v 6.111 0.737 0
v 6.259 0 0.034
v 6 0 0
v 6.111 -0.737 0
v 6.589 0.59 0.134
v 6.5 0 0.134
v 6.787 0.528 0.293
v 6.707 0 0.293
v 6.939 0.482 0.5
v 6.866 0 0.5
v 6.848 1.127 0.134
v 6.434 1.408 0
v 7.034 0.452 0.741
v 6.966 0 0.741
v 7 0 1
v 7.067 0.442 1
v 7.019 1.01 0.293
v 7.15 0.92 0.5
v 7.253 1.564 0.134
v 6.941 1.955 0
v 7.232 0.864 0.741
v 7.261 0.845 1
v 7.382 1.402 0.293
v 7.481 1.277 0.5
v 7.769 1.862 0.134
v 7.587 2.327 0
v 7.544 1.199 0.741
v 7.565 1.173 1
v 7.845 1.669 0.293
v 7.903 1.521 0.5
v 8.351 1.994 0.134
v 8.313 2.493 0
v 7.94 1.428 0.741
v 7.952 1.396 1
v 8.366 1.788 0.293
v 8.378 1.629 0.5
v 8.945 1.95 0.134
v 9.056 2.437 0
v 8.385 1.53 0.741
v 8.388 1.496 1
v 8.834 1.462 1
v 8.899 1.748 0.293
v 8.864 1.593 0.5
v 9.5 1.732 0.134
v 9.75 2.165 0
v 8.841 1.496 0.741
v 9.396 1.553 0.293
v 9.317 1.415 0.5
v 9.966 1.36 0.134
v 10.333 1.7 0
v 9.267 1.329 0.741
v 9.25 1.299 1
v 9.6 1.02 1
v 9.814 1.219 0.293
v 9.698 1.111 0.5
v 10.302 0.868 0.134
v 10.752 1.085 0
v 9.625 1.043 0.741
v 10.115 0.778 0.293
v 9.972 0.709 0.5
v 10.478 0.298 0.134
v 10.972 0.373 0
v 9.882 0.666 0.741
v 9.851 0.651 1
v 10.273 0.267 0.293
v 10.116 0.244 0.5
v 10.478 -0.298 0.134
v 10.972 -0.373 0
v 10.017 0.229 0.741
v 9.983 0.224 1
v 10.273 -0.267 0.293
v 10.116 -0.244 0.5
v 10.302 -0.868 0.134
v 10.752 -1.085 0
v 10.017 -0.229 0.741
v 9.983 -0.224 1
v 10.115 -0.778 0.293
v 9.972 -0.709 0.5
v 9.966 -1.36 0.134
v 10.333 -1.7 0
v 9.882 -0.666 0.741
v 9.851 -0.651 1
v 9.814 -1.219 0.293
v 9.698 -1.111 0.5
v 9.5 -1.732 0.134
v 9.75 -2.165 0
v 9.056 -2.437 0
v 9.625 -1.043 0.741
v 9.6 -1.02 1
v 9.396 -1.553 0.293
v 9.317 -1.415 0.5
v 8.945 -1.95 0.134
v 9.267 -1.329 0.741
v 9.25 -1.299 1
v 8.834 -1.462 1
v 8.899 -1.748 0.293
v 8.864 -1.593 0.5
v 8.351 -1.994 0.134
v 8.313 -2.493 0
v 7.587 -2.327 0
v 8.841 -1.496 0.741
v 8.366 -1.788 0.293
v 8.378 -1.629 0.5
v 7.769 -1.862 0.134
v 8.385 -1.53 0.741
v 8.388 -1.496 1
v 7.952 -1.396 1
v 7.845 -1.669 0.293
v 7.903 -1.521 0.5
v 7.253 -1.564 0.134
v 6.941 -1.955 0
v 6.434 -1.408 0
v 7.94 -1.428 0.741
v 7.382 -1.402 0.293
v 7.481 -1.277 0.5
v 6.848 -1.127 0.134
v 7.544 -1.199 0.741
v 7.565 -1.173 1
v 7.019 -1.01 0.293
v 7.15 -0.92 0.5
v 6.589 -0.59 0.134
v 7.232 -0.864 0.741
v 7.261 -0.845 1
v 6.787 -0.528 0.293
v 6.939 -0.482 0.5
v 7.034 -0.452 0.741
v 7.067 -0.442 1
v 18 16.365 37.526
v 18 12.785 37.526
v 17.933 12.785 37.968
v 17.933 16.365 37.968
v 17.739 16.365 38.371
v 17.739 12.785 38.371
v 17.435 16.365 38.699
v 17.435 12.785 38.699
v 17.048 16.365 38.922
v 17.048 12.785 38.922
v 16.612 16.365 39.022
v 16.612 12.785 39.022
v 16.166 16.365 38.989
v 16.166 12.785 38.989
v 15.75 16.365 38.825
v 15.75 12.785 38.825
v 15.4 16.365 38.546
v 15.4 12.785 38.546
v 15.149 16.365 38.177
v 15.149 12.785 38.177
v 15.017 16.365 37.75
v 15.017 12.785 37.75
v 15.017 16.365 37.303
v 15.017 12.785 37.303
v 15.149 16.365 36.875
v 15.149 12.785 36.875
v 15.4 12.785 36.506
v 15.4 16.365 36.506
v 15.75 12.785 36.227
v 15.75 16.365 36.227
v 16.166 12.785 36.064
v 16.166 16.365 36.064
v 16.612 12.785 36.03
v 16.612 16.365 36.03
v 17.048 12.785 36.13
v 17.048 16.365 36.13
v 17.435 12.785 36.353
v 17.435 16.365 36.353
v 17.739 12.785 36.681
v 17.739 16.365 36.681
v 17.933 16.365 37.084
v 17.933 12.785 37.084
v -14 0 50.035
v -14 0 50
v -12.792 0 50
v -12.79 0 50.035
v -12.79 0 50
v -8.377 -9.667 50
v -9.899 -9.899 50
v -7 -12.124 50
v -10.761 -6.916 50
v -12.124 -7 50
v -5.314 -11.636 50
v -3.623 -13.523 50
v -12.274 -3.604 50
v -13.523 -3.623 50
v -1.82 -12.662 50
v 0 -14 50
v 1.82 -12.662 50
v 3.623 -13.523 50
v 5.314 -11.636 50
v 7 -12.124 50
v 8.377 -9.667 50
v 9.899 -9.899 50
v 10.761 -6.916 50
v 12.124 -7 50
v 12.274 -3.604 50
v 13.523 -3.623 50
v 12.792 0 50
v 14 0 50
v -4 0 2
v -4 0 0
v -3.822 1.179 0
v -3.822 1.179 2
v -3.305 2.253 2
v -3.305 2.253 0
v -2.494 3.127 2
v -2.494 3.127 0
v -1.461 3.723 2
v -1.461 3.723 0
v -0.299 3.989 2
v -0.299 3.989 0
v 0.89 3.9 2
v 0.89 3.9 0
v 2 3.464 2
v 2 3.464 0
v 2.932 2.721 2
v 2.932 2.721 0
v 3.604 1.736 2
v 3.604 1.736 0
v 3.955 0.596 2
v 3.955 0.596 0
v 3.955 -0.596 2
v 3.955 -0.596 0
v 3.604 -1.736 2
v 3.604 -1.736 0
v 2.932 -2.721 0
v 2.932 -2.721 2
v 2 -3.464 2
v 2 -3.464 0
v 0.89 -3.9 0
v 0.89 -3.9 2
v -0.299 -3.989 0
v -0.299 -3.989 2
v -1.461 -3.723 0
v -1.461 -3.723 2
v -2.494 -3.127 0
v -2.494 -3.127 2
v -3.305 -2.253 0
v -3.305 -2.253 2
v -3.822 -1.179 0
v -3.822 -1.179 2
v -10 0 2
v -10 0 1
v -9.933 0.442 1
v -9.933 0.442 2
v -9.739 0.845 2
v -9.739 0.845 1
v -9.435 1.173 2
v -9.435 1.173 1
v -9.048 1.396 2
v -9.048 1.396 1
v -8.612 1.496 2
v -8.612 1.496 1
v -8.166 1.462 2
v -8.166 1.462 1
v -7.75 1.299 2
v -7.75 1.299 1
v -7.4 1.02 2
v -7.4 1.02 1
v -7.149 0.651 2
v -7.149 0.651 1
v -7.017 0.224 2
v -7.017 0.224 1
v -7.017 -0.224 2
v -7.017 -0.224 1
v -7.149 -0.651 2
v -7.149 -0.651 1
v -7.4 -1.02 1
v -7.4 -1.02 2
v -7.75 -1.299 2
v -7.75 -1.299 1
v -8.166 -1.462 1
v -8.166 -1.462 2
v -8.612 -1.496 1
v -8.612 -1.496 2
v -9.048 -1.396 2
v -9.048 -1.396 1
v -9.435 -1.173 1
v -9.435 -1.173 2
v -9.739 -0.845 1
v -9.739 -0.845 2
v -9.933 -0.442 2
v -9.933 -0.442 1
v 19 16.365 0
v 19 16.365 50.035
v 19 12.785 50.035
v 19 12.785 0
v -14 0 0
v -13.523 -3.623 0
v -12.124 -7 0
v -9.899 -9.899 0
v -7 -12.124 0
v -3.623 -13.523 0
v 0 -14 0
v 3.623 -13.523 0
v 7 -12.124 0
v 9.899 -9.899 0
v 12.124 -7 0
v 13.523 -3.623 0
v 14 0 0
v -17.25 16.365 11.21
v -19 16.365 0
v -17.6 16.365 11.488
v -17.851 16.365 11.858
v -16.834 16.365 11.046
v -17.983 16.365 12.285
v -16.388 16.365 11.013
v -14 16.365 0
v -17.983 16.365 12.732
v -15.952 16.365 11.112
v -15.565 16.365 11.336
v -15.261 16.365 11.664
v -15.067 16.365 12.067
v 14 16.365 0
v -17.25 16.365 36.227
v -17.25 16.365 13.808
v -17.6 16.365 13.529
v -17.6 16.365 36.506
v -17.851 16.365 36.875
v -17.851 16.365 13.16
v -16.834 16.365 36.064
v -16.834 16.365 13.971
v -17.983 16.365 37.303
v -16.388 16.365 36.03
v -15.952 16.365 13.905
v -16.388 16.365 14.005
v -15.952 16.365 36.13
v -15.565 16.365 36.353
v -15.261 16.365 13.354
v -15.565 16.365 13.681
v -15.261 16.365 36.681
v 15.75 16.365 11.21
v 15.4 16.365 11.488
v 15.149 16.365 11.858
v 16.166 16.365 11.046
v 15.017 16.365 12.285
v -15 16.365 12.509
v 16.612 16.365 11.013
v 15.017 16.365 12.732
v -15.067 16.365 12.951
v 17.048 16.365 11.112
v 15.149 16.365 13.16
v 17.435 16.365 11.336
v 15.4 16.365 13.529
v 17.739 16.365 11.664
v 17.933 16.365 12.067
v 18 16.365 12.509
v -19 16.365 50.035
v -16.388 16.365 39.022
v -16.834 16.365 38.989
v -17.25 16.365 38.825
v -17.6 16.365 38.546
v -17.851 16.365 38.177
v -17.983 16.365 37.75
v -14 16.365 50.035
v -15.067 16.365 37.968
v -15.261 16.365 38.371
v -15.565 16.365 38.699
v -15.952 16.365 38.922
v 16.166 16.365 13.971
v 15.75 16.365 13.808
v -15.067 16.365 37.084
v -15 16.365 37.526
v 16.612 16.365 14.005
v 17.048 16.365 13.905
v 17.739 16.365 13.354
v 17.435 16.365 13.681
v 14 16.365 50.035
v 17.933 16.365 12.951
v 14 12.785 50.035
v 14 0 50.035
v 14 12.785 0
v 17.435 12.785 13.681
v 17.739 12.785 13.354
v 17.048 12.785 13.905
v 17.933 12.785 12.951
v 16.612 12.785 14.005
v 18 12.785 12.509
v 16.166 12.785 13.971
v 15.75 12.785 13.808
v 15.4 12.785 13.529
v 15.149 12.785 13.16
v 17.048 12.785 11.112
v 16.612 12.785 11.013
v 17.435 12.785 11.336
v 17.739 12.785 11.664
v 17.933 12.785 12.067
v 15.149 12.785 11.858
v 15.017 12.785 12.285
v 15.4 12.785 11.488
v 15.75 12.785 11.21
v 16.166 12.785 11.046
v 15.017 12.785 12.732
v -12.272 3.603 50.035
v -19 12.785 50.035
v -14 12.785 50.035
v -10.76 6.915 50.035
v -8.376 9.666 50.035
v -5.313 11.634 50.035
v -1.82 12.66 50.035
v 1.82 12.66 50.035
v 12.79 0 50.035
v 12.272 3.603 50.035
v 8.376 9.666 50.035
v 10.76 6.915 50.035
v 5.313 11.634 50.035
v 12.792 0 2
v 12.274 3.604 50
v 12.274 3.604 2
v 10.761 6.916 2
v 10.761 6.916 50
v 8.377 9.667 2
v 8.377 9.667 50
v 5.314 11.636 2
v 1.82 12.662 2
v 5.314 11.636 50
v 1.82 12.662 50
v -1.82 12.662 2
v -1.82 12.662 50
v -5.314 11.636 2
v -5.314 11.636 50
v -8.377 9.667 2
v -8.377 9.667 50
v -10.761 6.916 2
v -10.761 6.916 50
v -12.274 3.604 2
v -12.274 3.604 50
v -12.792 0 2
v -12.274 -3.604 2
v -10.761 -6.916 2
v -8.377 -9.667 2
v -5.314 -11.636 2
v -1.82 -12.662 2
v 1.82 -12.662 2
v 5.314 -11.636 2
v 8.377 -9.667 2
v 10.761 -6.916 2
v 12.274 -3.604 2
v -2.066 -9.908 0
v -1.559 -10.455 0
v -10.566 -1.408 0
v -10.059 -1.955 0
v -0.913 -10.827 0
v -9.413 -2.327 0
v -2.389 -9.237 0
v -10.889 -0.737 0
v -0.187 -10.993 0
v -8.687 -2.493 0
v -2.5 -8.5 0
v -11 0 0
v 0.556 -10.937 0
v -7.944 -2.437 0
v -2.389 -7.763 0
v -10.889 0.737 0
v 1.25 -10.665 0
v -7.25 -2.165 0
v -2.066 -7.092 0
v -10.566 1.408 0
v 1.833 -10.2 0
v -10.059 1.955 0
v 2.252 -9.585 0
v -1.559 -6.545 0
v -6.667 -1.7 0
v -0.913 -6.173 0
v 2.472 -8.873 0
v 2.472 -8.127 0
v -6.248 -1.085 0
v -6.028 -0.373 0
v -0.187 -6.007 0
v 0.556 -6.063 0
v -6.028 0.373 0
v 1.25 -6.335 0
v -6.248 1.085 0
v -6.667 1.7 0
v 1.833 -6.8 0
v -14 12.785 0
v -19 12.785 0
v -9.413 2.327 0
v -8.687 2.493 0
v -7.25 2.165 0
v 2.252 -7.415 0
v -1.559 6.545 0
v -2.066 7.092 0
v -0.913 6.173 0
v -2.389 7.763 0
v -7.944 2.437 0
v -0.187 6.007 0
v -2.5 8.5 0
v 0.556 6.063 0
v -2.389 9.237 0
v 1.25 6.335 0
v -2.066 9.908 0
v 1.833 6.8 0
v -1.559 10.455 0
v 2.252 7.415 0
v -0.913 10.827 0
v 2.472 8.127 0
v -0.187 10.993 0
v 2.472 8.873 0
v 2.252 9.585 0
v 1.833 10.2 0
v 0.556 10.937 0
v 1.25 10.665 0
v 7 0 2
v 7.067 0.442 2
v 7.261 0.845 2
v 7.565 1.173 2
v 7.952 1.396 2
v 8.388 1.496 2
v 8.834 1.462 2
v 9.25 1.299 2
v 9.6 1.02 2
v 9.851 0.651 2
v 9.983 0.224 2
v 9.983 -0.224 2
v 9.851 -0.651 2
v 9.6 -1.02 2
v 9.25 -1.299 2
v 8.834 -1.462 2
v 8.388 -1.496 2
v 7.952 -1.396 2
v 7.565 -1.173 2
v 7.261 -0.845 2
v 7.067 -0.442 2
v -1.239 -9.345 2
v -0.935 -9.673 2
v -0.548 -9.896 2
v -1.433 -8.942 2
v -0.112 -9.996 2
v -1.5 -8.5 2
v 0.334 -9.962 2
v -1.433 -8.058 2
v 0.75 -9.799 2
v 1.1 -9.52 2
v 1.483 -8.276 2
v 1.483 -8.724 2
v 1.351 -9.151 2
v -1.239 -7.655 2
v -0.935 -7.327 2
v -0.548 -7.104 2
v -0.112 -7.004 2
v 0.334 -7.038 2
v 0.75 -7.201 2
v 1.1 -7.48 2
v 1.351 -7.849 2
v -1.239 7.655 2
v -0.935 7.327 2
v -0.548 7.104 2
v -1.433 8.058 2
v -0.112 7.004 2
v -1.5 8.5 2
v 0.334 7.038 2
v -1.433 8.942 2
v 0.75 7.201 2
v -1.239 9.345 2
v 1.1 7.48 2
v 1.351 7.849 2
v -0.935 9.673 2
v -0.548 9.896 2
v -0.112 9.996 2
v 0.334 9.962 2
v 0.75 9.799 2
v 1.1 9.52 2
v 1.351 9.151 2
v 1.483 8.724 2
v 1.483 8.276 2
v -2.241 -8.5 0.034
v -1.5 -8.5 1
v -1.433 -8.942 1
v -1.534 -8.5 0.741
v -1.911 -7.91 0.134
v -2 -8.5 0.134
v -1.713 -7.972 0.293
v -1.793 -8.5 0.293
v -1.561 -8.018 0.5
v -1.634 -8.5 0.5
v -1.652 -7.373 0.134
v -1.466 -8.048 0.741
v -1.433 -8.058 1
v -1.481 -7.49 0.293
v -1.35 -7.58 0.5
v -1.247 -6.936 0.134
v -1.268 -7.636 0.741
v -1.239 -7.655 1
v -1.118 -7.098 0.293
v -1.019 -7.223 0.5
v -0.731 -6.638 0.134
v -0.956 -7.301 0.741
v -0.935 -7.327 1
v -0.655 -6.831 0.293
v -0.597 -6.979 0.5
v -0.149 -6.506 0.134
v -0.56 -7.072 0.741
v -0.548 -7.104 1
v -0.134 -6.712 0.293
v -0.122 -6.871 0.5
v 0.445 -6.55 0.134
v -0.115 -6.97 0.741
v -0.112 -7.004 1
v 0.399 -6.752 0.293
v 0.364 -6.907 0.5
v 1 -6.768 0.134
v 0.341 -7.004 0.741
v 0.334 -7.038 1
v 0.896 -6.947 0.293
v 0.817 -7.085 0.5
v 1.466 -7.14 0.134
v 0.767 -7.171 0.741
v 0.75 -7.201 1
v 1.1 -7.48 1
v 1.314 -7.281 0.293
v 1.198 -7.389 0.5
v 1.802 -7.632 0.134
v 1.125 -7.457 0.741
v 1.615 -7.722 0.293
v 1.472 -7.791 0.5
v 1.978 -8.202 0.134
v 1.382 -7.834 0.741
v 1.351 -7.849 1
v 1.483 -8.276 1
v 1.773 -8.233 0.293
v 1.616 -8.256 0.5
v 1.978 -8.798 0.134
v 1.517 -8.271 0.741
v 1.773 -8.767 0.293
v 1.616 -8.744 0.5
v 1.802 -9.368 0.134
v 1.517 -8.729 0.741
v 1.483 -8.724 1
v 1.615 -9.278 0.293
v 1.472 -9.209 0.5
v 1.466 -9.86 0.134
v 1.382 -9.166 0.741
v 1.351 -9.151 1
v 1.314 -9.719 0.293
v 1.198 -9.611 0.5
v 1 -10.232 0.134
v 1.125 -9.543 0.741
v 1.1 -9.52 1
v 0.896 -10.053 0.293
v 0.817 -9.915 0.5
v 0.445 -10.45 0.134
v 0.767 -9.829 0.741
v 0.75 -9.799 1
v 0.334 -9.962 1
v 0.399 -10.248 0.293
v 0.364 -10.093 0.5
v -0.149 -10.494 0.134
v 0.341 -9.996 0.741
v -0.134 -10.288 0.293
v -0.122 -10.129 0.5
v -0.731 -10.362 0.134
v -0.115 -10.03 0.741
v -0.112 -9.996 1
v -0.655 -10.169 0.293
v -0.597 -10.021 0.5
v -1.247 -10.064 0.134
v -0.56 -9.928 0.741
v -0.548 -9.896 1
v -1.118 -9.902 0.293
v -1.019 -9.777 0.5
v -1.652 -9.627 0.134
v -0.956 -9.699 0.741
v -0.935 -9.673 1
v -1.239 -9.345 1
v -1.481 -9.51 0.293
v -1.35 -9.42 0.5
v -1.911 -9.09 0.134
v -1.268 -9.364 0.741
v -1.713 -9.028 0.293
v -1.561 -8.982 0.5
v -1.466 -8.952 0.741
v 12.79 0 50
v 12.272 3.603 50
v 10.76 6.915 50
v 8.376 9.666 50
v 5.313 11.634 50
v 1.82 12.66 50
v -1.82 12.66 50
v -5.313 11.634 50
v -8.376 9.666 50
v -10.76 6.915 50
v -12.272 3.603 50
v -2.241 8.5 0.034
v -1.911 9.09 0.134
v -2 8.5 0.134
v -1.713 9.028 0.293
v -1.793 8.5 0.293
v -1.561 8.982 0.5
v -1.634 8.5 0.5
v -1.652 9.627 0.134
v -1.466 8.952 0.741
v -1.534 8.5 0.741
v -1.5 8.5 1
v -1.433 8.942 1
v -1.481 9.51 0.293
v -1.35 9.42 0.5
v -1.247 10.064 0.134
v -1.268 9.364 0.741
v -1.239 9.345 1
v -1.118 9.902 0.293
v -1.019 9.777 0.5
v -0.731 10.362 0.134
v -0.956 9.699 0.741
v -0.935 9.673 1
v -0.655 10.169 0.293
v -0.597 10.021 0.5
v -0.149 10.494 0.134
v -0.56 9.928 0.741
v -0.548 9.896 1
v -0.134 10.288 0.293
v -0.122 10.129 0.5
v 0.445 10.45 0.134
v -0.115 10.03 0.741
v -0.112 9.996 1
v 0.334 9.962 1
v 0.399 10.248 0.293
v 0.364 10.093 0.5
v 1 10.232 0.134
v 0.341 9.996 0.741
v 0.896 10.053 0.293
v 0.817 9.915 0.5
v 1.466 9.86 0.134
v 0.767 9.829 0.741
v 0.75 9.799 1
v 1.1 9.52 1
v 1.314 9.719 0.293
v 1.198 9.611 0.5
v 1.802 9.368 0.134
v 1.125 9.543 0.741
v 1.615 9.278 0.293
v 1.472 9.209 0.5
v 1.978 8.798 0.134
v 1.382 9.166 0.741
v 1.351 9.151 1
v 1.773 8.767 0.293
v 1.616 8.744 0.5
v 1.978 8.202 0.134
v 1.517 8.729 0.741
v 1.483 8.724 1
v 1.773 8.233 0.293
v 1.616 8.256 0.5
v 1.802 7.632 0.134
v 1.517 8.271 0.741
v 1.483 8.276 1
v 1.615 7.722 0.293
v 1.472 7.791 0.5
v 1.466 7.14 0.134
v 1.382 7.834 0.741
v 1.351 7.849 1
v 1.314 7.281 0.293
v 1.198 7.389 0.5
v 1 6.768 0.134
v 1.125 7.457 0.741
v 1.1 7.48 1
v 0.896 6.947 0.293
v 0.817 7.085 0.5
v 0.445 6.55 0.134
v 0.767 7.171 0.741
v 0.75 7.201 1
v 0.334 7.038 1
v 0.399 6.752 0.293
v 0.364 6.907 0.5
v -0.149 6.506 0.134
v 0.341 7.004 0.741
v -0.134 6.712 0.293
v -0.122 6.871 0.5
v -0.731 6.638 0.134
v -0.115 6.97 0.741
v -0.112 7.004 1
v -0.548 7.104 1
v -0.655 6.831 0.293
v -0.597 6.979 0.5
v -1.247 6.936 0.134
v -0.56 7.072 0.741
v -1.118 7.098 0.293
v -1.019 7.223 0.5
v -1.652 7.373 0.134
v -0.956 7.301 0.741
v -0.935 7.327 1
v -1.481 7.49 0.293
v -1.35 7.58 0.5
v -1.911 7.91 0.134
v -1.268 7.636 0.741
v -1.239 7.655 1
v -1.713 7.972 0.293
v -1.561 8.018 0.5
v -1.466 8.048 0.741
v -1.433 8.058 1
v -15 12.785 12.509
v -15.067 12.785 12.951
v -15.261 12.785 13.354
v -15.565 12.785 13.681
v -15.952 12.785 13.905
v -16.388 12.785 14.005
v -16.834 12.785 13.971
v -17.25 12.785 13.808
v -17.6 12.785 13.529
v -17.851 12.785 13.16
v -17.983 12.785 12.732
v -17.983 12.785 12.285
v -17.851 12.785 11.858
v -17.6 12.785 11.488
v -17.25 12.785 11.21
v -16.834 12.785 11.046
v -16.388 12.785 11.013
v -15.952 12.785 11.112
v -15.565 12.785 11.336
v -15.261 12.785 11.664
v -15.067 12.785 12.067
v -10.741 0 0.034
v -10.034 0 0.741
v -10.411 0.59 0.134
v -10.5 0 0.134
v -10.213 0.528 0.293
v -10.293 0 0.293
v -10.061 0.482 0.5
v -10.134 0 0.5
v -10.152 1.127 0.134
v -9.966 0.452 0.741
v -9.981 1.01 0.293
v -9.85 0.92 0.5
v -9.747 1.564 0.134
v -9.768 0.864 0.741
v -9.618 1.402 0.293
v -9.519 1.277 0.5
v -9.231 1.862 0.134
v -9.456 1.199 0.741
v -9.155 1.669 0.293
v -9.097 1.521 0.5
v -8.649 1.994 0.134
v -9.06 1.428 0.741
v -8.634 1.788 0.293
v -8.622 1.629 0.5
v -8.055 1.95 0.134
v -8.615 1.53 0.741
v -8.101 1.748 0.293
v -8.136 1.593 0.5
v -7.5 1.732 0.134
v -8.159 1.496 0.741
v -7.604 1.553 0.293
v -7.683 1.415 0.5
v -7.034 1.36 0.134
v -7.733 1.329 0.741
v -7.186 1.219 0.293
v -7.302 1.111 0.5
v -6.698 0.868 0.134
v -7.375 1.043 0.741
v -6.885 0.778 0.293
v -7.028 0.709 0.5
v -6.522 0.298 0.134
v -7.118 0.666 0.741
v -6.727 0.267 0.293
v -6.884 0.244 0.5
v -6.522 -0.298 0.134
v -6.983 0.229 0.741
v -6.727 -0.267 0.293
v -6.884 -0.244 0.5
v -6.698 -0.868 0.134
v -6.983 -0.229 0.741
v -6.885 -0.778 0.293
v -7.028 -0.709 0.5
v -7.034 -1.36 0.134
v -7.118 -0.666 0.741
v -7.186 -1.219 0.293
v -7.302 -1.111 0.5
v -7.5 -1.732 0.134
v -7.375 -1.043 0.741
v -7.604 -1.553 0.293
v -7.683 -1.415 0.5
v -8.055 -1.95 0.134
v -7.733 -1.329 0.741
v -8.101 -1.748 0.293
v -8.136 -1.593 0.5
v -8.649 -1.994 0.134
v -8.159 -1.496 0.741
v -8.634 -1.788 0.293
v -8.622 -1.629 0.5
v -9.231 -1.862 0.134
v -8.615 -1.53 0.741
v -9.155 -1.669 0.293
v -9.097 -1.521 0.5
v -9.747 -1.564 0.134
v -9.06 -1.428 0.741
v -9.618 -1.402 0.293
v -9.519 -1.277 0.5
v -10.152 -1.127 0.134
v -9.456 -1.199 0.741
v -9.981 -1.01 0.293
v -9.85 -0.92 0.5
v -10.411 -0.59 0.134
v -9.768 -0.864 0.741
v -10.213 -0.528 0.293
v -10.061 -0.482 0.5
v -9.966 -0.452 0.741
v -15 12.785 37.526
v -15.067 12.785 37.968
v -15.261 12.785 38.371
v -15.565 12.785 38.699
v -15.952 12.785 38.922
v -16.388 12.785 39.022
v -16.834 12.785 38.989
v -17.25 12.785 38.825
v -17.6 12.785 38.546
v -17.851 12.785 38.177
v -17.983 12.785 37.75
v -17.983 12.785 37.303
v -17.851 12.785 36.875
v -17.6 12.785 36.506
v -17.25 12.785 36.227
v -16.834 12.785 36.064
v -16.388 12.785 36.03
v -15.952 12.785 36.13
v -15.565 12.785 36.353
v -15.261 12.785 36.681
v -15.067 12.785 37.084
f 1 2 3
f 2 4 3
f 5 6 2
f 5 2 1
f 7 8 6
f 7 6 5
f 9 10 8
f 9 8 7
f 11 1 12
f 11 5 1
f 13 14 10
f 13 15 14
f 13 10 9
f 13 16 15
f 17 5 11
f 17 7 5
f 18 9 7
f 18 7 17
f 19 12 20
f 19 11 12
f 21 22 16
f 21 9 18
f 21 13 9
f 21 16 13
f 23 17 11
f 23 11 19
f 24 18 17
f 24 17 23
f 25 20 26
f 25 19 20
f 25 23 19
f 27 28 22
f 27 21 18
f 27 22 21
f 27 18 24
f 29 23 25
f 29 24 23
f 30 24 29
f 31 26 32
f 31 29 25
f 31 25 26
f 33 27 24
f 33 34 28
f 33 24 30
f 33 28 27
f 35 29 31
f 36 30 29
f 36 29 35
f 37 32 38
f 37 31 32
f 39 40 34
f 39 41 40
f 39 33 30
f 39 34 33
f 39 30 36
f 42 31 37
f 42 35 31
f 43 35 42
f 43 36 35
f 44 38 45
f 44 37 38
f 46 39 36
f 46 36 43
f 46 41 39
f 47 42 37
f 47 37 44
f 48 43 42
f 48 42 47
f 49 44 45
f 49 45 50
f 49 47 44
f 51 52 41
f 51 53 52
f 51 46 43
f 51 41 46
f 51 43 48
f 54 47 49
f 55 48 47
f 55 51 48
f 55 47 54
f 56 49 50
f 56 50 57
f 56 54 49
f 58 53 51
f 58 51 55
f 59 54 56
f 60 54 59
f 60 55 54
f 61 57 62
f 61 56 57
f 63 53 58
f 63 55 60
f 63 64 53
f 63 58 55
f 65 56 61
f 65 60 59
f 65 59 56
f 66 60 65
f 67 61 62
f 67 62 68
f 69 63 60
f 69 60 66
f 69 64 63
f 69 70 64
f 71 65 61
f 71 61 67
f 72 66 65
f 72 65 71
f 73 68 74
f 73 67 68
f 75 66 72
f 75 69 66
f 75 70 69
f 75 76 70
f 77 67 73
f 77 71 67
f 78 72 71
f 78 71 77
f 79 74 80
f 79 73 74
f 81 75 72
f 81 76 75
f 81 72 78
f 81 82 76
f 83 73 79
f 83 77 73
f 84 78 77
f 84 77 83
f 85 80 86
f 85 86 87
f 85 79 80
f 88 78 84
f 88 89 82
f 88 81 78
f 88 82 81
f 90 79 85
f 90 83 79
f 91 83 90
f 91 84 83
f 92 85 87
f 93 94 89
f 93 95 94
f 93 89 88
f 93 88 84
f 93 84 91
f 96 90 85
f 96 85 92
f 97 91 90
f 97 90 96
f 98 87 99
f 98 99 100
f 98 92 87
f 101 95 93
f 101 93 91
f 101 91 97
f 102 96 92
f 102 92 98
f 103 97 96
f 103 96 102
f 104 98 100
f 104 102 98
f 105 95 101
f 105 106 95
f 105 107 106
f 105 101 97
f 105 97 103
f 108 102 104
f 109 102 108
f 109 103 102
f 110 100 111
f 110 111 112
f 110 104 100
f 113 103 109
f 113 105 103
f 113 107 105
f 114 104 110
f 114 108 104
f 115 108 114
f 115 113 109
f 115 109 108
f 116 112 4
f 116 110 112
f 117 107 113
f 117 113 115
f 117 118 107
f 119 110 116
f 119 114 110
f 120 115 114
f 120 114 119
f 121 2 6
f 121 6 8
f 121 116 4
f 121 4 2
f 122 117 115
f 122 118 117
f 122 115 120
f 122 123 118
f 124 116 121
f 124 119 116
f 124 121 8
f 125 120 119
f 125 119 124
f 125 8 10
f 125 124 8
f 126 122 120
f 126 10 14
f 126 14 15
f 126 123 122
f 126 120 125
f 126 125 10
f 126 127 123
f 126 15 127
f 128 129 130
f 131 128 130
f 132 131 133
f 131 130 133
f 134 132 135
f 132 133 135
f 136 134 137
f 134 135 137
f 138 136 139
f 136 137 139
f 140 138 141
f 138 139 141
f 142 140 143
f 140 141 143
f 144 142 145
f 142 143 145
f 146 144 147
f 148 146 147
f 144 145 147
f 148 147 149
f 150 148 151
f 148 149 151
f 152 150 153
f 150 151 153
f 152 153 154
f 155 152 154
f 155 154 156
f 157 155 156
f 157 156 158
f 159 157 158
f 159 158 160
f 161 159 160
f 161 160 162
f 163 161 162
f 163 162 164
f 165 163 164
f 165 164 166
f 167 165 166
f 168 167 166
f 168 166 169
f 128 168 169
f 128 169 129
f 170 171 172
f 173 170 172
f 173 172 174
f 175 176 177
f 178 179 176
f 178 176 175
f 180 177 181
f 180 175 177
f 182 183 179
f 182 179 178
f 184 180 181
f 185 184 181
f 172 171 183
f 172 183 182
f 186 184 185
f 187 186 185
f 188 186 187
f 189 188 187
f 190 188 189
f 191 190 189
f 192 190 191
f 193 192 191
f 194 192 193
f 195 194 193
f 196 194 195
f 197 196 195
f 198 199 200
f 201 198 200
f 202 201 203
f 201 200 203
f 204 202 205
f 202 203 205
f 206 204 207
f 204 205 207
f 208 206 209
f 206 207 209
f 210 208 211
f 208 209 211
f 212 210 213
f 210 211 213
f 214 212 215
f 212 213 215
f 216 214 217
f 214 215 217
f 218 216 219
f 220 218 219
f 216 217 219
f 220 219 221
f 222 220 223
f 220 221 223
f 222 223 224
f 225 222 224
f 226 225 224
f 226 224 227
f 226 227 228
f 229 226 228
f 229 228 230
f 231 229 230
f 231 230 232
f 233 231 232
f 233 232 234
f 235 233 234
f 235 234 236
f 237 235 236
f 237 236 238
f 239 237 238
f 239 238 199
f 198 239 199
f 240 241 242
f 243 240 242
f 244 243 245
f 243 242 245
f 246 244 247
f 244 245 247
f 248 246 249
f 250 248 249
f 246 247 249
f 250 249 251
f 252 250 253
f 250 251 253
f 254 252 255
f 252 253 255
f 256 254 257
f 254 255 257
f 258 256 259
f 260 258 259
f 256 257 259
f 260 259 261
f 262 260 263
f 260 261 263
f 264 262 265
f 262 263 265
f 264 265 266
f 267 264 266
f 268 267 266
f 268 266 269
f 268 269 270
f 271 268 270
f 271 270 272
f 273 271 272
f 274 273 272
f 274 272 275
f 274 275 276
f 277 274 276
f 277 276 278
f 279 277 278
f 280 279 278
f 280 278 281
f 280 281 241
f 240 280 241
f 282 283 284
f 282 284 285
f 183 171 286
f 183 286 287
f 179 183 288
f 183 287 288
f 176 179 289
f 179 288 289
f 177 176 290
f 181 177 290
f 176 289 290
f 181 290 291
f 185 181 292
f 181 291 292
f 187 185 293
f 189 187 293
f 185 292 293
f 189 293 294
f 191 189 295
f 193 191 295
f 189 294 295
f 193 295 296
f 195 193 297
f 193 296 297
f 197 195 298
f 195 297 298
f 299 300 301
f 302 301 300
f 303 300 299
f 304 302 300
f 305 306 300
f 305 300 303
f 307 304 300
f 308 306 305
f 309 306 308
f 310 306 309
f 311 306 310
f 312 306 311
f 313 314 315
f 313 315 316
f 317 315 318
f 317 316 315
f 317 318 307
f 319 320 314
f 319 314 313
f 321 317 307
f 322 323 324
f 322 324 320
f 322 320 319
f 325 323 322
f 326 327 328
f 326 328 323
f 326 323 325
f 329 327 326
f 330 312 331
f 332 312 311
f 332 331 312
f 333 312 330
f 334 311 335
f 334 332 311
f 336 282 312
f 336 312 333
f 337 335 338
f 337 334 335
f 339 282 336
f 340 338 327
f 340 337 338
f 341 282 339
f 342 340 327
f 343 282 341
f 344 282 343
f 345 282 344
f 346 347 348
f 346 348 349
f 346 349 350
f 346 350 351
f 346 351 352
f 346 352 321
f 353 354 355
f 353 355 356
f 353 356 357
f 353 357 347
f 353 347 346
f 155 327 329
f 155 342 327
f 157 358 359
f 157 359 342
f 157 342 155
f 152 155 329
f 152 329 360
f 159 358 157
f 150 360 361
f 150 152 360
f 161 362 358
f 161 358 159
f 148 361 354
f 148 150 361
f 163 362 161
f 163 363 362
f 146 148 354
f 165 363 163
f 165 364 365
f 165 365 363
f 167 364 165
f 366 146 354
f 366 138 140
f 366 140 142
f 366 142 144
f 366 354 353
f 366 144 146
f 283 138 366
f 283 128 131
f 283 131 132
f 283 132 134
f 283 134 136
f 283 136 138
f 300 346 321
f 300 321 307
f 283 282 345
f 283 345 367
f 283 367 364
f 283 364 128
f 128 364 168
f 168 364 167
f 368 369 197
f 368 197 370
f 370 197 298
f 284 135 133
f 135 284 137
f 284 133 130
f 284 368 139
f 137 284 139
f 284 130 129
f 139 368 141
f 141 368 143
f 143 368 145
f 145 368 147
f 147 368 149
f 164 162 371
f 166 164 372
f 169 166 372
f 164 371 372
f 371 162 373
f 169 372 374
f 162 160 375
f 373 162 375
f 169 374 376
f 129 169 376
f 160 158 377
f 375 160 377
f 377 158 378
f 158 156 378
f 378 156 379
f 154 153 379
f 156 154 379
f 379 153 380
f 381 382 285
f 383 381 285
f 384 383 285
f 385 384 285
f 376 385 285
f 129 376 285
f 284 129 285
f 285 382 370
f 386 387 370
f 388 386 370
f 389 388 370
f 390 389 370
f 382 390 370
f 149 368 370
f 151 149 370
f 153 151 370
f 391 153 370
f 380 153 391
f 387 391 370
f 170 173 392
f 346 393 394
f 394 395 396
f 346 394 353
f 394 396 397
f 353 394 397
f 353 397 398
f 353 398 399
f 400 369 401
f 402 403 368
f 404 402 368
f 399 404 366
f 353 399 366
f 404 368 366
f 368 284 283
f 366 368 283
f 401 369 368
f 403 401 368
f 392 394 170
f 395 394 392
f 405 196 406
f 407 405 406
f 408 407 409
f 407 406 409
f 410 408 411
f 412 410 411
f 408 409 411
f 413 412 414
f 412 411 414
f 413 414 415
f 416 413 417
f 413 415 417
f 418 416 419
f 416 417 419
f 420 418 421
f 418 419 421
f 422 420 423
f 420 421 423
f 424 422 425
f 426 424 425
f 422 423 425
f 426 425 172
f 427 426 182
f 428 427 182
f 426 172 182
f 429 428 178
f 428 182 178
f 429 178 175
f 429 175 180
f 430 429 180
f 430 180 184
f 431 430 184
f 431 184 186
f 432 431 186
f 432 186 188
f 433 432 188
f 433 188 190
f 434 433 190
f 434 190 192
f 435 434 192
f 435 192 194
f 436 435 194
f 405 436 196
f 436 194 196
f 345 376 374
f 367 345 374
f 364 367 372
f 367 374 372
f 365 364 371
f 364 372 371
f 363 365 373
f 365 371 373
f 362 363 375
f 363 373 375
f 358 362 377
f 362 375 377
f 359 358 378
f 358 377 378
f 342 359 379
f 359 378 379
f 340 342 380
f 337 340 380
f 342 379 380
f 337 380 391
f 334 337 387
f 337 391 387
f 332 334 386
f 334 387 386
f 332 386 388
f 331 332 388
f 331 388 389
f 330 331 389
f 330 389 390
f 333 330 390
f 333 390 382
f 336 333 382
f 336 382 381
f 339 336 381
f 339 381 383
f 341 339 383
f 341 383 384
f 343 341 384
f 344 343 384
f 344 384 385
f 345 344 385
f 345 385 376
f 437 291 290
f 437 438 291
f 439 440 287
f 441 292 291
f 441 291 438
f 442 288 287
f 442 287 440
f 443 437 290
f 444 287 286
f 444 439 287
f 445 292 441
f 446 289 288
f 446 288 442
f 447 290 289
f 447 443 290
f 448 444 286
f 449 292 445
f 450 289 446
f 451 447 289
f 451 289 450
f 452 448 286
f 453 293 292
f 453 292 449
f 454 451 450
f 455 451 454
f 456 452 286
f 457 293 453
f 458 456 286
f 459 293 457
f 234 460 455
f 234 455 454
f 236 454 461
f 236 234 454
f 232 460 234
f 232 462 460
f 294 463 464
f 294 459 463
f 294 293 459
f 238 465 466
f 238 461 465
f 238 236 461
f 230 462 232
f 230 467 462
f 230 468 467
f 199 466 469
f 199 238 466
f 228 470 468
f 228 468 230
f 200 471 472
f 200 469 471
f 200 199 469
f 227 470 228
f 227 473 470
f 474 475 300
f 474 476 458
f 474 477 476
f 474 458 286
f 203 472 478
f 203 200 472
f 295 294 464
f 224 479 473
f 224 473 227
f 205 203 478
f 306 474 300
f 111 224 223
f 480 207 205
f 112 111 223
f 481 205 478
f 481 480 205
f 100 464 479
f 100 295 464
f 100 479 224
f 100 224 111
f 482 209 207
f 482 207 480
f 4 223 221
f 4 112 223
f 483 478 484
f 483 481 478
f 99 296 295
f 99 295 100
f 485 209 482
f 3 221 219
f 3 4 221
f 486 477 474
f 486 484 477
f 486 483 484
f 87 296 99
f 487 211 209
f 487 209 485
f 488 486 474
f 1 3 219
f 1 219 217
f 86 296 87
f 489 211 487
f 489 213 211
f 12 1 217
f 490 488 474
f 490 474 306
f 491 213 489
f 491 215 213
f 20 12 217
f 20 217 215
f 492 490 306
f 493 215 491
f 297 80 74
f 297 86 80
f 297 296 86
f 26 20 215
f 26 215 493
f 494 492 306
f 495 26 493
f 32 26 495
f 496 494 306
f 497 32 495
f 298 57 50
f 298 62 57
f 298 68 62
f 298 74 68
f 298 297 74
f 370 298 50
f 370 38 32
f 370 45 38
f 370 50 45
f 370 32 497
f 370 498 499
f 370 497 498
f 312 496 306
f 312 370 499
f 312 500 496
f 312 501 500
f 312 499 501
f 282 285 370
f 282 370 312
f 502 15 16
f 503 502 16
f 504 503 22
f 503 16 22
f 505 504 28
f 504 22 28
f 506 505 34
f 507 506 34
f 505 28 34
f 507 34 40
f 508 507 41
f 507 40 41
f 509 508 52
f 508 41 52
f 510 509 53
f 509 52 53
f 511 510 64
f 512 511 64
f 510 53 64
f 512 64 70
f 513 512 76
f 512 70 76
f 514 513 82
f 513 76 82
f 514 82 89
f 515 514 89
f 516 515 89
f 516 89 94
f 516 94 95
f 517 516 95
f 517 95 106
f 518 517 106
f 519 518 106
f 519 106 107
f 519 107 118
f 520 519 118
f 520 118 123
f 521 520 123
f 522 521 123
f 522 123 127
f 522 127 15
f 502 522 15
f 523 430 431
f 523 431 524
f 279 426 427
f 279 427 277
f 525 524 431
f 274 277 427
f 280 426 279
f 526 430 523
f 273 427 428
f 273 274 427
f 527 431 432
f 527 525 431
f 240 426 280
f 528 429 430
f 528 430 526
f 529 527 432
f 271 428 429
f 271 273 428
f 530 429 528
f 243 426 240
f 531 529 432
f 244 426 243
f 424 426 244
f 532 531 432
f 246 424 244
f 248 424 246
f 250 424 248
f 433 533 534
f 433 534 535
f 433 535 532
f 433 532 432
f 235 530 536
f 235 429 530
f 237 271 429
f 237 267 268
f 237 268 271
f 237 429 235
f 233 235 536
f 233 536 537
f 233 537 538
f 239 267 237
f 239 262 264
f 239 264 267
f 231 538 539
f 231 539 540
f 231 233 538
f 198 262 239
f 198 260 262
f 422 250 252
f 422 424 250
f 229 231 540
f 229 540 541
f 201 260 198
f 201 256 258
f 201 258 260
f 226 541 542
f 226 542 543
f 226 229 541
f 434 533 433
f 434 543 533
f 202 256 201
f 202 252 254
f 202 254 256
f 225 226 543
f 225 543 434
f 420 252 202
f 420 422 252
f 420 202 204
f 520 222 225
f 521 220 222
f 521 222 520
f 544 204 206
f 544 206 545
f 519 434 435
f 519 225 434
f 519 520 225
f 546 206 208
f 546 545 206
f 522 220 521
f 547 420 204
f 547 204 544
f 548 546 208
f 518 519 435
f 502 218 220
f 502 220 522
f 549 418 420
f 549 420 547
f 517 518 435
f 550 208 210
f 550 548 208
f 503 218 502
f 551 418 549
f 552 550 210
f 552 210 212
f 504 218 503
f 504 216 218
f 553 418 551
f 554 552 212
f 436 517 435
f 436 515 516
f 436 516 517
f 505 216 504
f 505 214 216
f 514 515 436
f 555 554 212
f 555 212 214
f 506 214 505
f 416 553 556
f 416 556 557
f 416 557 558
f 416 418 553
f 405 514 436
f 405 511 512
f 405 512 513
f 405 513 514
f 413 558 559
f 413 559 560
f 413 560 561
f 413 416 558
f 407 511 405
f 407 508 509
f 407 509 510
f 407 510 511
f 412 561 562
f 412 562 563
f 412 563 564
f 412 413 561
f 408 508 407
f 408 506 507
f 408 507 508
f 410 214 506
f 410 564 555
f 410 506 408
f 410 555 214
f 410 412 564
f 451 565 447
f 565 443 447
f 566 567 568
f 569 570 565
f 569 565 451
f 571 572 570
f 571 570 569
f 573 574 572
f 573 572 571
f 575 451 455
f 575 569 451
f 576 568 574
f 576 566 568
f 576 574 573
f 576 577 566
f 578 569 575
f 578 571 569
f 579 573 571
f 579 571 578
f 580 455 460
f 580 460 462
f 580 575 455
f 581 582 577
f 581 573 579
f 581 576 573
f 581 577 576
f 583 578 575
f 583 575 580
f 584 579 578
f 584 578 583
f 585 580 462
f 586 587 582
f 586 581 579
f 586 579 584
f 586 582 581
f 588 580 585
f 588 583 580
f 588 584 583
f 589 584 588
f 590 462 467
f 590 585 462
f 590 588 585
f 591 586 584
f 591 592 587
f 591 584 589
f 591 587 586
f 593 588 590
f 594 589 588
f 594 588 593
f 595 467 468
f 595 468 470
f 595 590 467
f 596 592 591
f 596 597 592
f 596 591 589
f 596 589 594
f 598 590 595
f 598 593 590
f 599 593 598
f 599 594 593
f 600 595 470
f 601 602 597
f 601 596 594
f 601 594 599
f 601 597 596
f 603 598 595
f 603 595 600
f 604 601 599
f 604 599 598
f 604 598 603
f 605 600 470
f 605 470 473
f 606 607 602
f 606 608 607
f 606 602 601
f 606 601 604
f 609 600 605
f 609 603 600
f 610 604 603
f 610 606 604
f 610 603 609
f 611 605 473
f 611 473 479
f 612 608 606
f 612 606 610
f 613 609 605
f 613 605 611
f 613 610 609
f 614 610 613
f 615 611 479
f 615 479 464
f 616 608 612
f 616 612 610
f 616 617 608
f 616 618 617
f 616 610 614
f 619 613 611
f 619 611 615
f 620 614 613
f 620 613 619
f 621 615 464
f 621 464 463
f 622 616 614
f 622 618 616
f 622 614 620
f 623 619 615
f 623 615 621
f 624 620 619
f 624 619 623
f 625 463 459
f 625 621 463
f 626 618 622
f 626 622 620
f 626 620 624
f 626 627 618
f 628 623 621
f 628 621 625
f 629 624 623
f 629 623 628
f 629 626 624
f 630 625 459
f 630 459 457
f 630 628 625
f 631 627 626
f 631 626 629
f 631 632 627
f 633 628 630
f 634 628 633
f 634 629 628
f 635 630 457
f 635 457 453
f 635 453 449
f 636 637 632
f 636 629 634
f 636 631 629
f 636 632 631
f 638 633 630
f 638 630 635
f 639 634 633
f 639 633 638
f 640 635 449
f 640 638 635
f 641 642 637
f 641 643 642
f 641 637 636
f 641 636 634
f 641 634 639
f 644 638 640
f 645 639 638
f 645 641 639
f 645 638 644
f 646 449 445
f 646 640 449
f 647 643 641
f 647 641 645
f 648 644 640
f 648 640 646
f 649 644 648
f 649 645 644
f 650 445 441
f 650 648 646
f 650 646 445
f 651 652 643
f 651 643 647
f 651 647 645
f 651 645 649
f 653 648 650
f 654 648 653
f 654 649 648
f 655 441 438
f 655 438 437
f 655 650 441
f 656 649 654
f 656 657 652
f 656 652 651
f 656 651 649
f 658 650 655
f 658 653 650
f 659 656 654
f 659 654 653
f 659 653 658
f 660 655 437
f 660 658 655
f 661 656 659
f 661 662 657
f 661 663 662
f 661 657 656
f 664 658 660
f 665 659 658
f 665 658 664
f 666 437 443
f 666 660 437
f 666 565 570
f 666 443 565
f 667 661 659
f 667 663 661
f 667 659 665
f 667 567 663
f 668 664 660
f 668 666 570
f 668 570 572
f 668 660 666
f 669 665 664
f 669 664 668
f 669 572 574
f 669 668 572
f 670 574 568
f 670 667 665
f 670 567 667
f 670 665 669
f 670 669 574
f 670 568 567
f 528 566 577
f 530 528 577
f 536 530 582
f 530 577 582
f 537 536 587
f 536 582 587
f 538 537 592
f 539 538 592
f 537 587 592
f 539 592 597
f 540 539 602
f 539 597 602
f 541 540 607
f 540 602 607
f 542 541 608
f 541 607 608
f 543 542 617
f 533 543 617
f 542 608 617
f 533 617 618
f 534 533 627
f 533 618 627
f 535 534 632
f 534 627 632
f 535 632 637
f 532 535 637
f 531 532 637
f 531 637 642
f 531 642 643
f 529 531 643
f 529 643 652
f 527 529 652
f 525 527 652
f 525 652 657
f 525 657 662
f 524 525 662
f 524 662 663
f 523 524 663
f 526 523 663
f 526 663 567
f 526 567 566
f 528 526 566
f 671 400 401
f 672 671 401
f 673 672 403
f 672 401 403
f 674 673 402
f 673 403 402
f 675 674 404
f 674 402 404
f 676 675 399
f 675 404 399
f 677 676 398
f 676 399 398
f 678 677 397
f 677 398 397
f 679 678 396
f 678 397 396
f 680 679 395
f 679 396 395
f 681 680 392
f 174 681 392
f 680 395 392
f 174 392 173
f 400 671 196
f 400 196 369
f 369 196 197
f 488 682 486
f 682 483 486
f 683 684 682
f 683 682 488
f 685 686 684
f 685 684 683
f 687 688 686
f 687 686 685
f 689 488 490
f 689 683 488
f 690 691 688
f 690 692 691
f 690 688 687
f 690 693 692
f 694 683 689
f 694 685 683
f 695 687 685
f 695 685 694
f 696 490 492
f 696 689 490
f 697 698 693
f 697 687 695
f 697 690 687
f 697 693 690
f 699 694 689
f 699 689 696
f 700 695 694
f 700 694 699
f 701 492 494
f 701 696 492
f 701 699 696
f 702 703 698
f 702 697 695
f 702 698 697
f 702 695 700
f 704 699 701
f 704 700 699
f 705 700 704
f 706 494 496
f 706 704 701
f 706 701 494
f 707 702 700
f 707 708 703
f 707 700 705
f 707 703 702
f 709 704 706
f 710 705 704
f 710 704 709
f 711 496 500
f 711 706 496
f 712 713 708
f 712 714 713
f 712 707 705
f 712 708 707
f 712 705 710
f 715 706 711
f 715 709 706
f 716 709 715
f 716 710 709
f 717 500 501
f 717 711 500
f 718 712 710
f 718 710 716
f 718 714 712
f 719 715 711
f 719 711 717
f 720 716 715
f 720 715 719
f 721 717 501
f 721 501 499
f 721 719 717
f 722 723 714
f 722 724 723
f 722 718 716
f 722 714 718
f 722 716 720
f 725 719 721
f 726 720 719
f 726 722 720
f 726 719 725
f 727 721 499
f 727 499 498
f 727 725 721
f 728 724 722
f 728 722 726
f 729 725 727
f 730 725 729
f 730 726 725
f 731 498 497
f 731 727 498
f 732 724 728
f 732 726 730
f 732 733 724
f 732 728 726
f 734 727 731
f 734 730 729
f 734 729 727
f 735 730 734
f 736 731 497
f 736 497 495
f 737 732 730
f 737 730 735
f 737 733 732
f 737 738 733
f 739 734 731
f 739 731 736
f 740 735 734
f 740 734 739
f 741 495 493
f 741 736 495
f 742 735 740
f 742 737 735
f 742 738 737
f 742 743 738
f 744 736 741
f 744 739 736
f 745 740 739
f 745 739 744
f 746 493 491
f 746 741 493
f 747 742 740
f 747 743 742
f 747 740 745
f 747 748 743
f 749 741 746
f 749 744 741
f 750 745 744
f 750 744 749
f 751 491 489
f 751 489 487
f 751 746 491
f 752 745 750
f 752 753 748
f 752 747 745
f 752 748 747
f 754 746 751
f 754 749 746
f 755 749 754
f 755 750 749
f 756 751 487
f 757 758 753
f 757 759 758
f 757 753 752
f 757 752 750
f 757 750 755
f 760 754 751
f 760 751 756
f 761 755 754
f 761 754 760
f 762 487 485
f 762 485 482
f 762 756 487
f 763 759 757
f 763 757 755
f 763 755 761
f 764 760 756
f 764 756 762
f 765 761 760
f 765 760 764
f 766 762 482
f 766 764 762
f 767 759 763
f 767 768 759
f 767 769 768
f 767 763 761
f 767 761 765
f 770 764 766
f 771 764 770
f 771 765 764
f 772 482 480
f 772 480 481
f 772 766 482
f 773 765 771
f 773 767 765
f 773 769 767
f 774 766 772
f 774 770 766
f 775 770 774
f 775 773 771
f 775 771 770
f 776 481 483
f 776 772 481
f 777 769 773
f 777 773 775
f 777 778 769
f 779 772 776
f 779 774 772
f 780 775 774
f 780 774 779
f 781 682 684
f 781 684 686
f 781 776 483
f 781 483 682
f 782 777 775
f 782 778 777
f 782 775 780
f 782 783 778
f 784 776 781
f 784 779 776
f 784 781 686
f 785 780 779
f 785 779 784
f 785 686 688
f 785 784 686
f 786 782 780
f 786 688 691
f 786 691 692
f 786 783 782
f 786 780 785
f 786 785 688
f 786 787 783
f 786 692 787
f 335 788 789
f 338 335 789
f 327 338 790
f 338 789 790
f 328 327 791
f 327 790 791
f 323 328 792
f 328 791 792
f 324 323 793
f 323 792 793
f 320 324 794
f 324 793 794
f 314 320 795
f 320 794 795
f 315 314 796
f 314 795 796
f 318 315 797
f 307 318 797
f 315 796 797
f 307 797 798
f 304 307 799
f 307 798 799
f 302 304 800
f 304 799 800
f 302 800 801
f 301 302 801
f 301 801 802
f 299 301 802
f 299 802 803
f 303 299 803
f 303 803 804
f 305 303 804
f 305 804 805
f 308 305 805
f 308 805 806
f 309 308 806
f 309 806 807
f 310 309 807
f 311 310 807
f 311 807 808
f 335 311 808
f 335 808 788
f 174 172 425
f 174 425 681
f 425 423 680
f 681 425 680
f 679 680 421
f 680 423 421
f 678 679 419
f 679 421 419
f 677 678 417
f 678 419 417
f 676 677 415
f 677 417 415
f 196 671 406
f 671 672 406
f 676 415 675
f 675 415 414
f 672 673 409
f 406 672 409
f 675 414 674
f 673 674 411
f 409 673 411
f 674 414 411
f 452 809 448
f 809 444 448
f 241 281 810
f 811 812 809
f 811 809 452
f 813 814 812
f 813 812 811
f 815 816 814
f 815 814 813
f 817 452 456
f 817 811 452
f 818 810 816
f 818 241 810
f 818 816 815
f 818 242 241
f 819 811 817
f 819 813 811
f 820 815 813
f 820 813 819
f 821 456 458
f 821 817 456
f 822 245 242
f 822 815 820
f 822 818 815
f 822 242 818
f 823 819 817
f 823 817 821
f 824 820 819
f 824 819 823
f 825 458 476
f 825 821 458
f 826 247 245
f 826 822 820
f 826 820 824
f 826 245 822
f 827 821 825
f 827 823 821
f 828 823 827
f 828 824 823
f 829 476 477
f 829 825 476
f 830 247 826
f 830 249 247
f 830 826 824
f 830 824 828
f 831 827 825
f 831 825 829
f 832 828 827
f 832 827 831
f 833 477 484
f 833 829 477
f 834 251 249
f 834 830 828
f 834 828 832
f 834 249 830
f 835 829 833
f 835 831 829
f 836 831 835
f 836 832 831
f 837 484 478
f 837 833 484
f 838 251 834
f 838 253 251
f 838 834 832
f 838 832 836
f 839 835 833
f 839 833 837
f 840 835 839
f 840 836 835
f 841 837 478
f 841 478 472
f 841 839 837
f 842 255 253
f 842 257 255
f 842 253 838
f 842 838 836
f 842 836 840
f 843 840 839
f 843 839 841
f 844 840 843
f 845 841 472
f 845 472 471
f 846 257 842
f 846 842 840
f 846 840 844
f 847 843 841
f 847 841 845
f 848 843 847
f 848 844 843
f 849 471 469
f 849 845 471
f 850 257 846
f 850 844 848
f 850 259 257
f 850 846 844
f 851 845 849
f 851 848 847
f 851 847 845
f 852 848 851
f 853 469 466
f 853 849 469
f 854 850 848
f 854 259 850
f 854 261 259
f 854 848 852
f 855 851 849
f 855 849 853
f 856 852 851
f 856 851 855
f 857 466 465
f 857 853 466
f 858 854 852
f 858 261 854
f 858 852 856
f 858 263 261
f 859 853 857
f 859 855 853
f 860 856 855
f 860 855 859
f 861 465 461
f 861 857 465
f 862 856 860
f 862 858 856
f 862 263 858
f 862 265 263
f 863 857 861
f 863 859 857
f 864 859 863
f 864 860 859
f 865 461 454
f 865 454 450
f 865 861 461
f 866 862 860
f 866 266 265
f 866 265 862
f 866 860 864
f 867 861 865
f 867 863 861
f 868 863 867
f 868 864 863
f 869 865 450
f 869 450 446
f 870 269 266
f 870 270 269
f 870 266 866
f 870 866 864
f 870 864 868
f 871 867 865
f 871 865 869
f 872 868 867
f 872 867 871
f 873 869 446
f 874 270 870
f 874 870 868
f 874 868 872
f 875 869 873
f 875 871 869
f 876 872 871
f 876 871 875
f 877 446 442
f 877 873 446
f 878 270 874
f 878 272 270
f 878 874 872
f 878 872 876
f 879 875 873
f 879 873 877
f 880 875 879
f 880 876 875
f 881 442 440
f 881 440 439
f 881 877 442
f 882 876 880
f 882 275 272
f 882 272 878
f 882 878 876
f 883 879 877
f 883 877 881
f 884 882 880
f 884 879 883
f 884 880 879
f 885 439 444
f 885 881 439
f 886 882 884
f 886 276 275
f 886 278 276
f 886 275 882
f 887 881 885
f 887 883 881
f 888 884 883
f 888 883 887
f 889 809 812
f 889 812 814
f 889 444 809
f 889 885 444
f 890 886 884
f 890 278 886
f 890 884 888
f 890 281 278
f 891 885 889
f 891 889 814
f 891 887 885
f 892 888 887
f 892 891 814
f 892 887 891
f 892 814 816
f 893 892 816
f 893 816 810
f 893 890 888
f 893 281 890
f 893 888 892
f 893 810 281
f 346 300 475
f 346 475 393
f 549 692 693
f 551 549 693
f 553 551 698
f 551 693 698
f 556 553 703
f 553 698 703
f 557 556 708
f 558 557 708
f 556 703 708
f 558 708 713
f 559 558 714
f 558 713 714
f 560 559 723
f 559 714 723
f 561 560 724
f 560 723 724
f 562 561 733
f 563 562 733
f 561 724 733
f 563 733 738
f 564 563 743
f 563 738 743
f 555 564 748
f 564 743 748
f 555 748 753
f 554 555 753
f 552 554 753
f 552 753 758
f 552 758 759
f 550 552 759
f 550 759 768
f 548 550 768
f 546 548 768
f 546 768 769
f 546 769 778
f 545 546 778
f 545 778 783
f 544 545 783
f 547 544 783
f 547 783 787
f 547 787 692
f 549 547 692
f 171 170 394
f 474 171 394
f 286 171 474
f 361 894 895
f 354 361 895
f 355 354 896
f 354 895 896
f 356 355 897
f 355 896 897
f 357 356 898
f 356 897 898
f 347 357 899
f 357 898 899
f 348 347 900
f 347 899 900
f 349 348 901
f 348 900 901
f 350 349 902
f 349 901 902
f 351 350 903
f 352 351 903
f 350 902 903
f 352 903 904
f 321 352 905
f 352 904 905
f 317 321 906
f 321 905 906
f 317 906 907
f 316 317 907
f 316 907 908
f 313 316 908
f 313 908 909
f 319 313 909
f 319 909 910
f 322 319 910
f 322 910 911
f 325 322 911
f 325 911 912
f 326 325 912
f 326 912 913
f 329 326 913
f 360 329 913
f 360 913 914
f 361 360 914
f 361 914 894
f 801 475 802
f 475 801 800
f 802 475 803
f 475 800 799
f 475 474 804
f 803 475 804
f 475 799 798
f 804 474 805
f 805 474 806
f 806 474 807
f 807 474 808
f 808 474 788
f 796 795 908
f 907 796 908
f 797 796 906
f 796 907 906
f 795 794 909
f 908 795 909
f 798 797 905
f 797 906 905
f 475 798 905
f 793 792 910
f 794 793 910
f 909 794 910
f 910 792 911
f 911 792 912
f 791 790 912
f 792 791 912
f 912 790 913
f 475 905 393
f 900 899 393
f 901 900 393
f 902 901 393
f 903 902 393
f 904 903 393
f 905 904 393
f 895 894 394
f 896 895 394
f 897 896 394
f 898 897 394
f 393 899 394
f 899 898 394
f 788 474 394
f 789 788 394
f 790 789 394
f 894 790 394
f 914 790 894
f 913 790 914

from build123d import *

# Parameters (mm, degrees)
SKETCH1_R           = 14
BOSS_EXTRUDE1_DEPTH = 50
SKETCH5_W           = 28
SKETCH5_H           = 50.034880911
BOSS_EXTRUDE2_DEPTH = 21
SKETCH2_R           = 12.791811967
CUT_EXTRUDE1_DEPTH  = 48
SKETCH3_R           = 4
CUT_EXTRUDE2_DEPTH  = 49
SKETCH4_R           = 1.5
CUT_EXTRUDE3_DEPTH  = 49
SKETCH6_R           = 12.79
CUT_EXTRUDE5_DEPTH  = 21
SKETCH7_W           = 28
SKETCH7_H           = 4.634699127
CUT_EXTRUDE6_DEPTH  = 53
SKETCH8_W           = 50.034880911
SKETCH8_H           = 3.58
BOSS_EXTRUDE3_DEPTH = 5
SKETCH13_R          = 1.5
CUT_EXTRUDE7_DEPTH  = 5
SKETCH14_W          = 50.034880911
SKETCH14_H          = 3.58
BOSS_EXTRUDE4_DEPTH = 5
SKETCH15_R          = 1.5
CUT_EXTRUDE8_DEPTH  = 5
FILLET1_R           = 1
FILLET2_R           = 1


with BuildPart() as part:
    # Sketch1 → Boss-Extrude1 (new body)
    with BuildSketch(Plane.XY):
        Circle(SKETCH1_R)
    extrude(amount=BOSS_EXTRUDE1_DEPTH)

    # Sketch5 → Boss-Extrude2 (add)
    with BuildSketch(Plane(origin=(0, 0, 0), x_dir=(1, 0, 0), z_dir=(0, 1, 0))):
        with Locations((0, -25.017440456)):
            Rectangle(SKETCH5_W, SKETCH5_H)
    extrude(amount=BOSS_EXTRUDE2_DEPTH)

    # Sketch2 → Cut-Extrude1 (cut)
    with BuildSketch(Plane.XY.offset(50)):
        Circle(SKETCH2_R)
    extrude(amount=-CUT_EXTRUDE1_DEPTH, mode=Mode.SUBTRACT)

    # Sketch3 → Cut-Extrude2 (cut)
    with BuildSketch(Plane(origin=(0, 0, 0), x_dir=(-1, 0, 0), z_dir=(0, 0, -1))):
        Circle(SKETCH3_R)
    extrude(amount=-CUT_EXTRUDE2_DEPTH, mode=Mode.SUBTRACT)

    # Sketch4 → Cut-Extrude3 (cut)
    with BuildSketch(Plane(origin=(0, 0, 0), x_dir=(-1, 0, 0), z_dir=(0, 0, -1))):
        with Locations((0, -8.5)):
            Circle(SKETCH4_R)
        with Locations((0, 8.5)):
            Circle(SKETCH4_R)
        with Locations((8.5, 0)):
            Circle(SKETCH4_R)
        with Locations((-8.5, 0)):
            Circle(SKETCH4_R)
    extrude(amount=-CUT_EXTRUDE3_DEPTH, mode=Mode.SUBTRACT)

    # Sketch6 → Cut-Extrude5 (cut)
    with BuildSketch(Plane.XY.offset(50.034880911)):
        Circle(SKETCH6_R)
    extrude(amount=-CUT_EXTRUDE5_DEPTH, mode=Mode.SUBTRACT)

    # Sketch7 → Cut-Extrude6 (cut)
    with BuildSketch(Plane.XY.offset(50.034880911)):
        with Locations((0, 18.682650437)):
            Rectangle(SKETCH7_W, SKETCH7_H)
    extrude(amount=-CUT_EXTRUDE6_DEPTH, mode=Mode.SUBTRACT)

    # Sketch8 → Boss-Extrude3 (add)
    with BuildSketch(Plane(origin=(14, 0, 0), x_dir=(0, 0, -1), z_dir=(1, 0, 0))):
        with Locations((-25.017440456, 14.575300873)):
            Rectangle(SKETCH8_W, SKETCH8_H)
    extrude(amount=BOSS_EXTRUDE3_DEPTH)

    # Sketch13 → Cut-Extrude7 (cut)
    with BuildSketch(Plane.XZ.offset(-12.785300873)):
        with Locations((16.5, 37.526160683)):
            Circle(SKETCH13_R)
        with Locations((16.5, 12.508720228)):
            Circle(SKETCH13_R)
    extrude(amount=-CUT_EXTRUDE7_DEPTH, mode=Mode.SUBTRACT)

    # Sketch14 → Boss-Extrude4 (add)
    with BuildSketch(Plane.ZY.offset(14)):
        with Locations((25.017440456, 14.575300873)):
            Rectangle(SKETCH14_W, SKETCH14_H)
    extrude(amount=BOSS_EXTRUDE4_DEPTH)

    # Sketch15 → Cut-Extrude8 (cut)
    with BuildSketch(Plane.XZ.offset(-12.785300873)):
        with Locations((-16.5, 12.508720228)):
            Circle(SKETCH15_R)
        with Locations((-16.5, 37.526160683)):
            Circle(SKETCH15_R)
    extrude(amount=-CUT_EXTRUDE8_DEPTH, mode=Mode.SUBTRACT)

    # Fillet1
    fillet1_edges = [part.edges().sort_by_distance(p)[0] for p in [
        (10, 0, 0),
    ]]
    fillet(fillet1_edges, radius=FILLET1_R)

    # Fillet2
    fillet2_edges = [part.edges().sort_by_distance(p)[0] for p in [
        (1.5, -8.5, 0),
        (1.5, 8.5, 0),
        (-7, 0, 0),
    ]]
    fillet(fillet2_edges, radius=FILLET2_R)


solid = part.part
